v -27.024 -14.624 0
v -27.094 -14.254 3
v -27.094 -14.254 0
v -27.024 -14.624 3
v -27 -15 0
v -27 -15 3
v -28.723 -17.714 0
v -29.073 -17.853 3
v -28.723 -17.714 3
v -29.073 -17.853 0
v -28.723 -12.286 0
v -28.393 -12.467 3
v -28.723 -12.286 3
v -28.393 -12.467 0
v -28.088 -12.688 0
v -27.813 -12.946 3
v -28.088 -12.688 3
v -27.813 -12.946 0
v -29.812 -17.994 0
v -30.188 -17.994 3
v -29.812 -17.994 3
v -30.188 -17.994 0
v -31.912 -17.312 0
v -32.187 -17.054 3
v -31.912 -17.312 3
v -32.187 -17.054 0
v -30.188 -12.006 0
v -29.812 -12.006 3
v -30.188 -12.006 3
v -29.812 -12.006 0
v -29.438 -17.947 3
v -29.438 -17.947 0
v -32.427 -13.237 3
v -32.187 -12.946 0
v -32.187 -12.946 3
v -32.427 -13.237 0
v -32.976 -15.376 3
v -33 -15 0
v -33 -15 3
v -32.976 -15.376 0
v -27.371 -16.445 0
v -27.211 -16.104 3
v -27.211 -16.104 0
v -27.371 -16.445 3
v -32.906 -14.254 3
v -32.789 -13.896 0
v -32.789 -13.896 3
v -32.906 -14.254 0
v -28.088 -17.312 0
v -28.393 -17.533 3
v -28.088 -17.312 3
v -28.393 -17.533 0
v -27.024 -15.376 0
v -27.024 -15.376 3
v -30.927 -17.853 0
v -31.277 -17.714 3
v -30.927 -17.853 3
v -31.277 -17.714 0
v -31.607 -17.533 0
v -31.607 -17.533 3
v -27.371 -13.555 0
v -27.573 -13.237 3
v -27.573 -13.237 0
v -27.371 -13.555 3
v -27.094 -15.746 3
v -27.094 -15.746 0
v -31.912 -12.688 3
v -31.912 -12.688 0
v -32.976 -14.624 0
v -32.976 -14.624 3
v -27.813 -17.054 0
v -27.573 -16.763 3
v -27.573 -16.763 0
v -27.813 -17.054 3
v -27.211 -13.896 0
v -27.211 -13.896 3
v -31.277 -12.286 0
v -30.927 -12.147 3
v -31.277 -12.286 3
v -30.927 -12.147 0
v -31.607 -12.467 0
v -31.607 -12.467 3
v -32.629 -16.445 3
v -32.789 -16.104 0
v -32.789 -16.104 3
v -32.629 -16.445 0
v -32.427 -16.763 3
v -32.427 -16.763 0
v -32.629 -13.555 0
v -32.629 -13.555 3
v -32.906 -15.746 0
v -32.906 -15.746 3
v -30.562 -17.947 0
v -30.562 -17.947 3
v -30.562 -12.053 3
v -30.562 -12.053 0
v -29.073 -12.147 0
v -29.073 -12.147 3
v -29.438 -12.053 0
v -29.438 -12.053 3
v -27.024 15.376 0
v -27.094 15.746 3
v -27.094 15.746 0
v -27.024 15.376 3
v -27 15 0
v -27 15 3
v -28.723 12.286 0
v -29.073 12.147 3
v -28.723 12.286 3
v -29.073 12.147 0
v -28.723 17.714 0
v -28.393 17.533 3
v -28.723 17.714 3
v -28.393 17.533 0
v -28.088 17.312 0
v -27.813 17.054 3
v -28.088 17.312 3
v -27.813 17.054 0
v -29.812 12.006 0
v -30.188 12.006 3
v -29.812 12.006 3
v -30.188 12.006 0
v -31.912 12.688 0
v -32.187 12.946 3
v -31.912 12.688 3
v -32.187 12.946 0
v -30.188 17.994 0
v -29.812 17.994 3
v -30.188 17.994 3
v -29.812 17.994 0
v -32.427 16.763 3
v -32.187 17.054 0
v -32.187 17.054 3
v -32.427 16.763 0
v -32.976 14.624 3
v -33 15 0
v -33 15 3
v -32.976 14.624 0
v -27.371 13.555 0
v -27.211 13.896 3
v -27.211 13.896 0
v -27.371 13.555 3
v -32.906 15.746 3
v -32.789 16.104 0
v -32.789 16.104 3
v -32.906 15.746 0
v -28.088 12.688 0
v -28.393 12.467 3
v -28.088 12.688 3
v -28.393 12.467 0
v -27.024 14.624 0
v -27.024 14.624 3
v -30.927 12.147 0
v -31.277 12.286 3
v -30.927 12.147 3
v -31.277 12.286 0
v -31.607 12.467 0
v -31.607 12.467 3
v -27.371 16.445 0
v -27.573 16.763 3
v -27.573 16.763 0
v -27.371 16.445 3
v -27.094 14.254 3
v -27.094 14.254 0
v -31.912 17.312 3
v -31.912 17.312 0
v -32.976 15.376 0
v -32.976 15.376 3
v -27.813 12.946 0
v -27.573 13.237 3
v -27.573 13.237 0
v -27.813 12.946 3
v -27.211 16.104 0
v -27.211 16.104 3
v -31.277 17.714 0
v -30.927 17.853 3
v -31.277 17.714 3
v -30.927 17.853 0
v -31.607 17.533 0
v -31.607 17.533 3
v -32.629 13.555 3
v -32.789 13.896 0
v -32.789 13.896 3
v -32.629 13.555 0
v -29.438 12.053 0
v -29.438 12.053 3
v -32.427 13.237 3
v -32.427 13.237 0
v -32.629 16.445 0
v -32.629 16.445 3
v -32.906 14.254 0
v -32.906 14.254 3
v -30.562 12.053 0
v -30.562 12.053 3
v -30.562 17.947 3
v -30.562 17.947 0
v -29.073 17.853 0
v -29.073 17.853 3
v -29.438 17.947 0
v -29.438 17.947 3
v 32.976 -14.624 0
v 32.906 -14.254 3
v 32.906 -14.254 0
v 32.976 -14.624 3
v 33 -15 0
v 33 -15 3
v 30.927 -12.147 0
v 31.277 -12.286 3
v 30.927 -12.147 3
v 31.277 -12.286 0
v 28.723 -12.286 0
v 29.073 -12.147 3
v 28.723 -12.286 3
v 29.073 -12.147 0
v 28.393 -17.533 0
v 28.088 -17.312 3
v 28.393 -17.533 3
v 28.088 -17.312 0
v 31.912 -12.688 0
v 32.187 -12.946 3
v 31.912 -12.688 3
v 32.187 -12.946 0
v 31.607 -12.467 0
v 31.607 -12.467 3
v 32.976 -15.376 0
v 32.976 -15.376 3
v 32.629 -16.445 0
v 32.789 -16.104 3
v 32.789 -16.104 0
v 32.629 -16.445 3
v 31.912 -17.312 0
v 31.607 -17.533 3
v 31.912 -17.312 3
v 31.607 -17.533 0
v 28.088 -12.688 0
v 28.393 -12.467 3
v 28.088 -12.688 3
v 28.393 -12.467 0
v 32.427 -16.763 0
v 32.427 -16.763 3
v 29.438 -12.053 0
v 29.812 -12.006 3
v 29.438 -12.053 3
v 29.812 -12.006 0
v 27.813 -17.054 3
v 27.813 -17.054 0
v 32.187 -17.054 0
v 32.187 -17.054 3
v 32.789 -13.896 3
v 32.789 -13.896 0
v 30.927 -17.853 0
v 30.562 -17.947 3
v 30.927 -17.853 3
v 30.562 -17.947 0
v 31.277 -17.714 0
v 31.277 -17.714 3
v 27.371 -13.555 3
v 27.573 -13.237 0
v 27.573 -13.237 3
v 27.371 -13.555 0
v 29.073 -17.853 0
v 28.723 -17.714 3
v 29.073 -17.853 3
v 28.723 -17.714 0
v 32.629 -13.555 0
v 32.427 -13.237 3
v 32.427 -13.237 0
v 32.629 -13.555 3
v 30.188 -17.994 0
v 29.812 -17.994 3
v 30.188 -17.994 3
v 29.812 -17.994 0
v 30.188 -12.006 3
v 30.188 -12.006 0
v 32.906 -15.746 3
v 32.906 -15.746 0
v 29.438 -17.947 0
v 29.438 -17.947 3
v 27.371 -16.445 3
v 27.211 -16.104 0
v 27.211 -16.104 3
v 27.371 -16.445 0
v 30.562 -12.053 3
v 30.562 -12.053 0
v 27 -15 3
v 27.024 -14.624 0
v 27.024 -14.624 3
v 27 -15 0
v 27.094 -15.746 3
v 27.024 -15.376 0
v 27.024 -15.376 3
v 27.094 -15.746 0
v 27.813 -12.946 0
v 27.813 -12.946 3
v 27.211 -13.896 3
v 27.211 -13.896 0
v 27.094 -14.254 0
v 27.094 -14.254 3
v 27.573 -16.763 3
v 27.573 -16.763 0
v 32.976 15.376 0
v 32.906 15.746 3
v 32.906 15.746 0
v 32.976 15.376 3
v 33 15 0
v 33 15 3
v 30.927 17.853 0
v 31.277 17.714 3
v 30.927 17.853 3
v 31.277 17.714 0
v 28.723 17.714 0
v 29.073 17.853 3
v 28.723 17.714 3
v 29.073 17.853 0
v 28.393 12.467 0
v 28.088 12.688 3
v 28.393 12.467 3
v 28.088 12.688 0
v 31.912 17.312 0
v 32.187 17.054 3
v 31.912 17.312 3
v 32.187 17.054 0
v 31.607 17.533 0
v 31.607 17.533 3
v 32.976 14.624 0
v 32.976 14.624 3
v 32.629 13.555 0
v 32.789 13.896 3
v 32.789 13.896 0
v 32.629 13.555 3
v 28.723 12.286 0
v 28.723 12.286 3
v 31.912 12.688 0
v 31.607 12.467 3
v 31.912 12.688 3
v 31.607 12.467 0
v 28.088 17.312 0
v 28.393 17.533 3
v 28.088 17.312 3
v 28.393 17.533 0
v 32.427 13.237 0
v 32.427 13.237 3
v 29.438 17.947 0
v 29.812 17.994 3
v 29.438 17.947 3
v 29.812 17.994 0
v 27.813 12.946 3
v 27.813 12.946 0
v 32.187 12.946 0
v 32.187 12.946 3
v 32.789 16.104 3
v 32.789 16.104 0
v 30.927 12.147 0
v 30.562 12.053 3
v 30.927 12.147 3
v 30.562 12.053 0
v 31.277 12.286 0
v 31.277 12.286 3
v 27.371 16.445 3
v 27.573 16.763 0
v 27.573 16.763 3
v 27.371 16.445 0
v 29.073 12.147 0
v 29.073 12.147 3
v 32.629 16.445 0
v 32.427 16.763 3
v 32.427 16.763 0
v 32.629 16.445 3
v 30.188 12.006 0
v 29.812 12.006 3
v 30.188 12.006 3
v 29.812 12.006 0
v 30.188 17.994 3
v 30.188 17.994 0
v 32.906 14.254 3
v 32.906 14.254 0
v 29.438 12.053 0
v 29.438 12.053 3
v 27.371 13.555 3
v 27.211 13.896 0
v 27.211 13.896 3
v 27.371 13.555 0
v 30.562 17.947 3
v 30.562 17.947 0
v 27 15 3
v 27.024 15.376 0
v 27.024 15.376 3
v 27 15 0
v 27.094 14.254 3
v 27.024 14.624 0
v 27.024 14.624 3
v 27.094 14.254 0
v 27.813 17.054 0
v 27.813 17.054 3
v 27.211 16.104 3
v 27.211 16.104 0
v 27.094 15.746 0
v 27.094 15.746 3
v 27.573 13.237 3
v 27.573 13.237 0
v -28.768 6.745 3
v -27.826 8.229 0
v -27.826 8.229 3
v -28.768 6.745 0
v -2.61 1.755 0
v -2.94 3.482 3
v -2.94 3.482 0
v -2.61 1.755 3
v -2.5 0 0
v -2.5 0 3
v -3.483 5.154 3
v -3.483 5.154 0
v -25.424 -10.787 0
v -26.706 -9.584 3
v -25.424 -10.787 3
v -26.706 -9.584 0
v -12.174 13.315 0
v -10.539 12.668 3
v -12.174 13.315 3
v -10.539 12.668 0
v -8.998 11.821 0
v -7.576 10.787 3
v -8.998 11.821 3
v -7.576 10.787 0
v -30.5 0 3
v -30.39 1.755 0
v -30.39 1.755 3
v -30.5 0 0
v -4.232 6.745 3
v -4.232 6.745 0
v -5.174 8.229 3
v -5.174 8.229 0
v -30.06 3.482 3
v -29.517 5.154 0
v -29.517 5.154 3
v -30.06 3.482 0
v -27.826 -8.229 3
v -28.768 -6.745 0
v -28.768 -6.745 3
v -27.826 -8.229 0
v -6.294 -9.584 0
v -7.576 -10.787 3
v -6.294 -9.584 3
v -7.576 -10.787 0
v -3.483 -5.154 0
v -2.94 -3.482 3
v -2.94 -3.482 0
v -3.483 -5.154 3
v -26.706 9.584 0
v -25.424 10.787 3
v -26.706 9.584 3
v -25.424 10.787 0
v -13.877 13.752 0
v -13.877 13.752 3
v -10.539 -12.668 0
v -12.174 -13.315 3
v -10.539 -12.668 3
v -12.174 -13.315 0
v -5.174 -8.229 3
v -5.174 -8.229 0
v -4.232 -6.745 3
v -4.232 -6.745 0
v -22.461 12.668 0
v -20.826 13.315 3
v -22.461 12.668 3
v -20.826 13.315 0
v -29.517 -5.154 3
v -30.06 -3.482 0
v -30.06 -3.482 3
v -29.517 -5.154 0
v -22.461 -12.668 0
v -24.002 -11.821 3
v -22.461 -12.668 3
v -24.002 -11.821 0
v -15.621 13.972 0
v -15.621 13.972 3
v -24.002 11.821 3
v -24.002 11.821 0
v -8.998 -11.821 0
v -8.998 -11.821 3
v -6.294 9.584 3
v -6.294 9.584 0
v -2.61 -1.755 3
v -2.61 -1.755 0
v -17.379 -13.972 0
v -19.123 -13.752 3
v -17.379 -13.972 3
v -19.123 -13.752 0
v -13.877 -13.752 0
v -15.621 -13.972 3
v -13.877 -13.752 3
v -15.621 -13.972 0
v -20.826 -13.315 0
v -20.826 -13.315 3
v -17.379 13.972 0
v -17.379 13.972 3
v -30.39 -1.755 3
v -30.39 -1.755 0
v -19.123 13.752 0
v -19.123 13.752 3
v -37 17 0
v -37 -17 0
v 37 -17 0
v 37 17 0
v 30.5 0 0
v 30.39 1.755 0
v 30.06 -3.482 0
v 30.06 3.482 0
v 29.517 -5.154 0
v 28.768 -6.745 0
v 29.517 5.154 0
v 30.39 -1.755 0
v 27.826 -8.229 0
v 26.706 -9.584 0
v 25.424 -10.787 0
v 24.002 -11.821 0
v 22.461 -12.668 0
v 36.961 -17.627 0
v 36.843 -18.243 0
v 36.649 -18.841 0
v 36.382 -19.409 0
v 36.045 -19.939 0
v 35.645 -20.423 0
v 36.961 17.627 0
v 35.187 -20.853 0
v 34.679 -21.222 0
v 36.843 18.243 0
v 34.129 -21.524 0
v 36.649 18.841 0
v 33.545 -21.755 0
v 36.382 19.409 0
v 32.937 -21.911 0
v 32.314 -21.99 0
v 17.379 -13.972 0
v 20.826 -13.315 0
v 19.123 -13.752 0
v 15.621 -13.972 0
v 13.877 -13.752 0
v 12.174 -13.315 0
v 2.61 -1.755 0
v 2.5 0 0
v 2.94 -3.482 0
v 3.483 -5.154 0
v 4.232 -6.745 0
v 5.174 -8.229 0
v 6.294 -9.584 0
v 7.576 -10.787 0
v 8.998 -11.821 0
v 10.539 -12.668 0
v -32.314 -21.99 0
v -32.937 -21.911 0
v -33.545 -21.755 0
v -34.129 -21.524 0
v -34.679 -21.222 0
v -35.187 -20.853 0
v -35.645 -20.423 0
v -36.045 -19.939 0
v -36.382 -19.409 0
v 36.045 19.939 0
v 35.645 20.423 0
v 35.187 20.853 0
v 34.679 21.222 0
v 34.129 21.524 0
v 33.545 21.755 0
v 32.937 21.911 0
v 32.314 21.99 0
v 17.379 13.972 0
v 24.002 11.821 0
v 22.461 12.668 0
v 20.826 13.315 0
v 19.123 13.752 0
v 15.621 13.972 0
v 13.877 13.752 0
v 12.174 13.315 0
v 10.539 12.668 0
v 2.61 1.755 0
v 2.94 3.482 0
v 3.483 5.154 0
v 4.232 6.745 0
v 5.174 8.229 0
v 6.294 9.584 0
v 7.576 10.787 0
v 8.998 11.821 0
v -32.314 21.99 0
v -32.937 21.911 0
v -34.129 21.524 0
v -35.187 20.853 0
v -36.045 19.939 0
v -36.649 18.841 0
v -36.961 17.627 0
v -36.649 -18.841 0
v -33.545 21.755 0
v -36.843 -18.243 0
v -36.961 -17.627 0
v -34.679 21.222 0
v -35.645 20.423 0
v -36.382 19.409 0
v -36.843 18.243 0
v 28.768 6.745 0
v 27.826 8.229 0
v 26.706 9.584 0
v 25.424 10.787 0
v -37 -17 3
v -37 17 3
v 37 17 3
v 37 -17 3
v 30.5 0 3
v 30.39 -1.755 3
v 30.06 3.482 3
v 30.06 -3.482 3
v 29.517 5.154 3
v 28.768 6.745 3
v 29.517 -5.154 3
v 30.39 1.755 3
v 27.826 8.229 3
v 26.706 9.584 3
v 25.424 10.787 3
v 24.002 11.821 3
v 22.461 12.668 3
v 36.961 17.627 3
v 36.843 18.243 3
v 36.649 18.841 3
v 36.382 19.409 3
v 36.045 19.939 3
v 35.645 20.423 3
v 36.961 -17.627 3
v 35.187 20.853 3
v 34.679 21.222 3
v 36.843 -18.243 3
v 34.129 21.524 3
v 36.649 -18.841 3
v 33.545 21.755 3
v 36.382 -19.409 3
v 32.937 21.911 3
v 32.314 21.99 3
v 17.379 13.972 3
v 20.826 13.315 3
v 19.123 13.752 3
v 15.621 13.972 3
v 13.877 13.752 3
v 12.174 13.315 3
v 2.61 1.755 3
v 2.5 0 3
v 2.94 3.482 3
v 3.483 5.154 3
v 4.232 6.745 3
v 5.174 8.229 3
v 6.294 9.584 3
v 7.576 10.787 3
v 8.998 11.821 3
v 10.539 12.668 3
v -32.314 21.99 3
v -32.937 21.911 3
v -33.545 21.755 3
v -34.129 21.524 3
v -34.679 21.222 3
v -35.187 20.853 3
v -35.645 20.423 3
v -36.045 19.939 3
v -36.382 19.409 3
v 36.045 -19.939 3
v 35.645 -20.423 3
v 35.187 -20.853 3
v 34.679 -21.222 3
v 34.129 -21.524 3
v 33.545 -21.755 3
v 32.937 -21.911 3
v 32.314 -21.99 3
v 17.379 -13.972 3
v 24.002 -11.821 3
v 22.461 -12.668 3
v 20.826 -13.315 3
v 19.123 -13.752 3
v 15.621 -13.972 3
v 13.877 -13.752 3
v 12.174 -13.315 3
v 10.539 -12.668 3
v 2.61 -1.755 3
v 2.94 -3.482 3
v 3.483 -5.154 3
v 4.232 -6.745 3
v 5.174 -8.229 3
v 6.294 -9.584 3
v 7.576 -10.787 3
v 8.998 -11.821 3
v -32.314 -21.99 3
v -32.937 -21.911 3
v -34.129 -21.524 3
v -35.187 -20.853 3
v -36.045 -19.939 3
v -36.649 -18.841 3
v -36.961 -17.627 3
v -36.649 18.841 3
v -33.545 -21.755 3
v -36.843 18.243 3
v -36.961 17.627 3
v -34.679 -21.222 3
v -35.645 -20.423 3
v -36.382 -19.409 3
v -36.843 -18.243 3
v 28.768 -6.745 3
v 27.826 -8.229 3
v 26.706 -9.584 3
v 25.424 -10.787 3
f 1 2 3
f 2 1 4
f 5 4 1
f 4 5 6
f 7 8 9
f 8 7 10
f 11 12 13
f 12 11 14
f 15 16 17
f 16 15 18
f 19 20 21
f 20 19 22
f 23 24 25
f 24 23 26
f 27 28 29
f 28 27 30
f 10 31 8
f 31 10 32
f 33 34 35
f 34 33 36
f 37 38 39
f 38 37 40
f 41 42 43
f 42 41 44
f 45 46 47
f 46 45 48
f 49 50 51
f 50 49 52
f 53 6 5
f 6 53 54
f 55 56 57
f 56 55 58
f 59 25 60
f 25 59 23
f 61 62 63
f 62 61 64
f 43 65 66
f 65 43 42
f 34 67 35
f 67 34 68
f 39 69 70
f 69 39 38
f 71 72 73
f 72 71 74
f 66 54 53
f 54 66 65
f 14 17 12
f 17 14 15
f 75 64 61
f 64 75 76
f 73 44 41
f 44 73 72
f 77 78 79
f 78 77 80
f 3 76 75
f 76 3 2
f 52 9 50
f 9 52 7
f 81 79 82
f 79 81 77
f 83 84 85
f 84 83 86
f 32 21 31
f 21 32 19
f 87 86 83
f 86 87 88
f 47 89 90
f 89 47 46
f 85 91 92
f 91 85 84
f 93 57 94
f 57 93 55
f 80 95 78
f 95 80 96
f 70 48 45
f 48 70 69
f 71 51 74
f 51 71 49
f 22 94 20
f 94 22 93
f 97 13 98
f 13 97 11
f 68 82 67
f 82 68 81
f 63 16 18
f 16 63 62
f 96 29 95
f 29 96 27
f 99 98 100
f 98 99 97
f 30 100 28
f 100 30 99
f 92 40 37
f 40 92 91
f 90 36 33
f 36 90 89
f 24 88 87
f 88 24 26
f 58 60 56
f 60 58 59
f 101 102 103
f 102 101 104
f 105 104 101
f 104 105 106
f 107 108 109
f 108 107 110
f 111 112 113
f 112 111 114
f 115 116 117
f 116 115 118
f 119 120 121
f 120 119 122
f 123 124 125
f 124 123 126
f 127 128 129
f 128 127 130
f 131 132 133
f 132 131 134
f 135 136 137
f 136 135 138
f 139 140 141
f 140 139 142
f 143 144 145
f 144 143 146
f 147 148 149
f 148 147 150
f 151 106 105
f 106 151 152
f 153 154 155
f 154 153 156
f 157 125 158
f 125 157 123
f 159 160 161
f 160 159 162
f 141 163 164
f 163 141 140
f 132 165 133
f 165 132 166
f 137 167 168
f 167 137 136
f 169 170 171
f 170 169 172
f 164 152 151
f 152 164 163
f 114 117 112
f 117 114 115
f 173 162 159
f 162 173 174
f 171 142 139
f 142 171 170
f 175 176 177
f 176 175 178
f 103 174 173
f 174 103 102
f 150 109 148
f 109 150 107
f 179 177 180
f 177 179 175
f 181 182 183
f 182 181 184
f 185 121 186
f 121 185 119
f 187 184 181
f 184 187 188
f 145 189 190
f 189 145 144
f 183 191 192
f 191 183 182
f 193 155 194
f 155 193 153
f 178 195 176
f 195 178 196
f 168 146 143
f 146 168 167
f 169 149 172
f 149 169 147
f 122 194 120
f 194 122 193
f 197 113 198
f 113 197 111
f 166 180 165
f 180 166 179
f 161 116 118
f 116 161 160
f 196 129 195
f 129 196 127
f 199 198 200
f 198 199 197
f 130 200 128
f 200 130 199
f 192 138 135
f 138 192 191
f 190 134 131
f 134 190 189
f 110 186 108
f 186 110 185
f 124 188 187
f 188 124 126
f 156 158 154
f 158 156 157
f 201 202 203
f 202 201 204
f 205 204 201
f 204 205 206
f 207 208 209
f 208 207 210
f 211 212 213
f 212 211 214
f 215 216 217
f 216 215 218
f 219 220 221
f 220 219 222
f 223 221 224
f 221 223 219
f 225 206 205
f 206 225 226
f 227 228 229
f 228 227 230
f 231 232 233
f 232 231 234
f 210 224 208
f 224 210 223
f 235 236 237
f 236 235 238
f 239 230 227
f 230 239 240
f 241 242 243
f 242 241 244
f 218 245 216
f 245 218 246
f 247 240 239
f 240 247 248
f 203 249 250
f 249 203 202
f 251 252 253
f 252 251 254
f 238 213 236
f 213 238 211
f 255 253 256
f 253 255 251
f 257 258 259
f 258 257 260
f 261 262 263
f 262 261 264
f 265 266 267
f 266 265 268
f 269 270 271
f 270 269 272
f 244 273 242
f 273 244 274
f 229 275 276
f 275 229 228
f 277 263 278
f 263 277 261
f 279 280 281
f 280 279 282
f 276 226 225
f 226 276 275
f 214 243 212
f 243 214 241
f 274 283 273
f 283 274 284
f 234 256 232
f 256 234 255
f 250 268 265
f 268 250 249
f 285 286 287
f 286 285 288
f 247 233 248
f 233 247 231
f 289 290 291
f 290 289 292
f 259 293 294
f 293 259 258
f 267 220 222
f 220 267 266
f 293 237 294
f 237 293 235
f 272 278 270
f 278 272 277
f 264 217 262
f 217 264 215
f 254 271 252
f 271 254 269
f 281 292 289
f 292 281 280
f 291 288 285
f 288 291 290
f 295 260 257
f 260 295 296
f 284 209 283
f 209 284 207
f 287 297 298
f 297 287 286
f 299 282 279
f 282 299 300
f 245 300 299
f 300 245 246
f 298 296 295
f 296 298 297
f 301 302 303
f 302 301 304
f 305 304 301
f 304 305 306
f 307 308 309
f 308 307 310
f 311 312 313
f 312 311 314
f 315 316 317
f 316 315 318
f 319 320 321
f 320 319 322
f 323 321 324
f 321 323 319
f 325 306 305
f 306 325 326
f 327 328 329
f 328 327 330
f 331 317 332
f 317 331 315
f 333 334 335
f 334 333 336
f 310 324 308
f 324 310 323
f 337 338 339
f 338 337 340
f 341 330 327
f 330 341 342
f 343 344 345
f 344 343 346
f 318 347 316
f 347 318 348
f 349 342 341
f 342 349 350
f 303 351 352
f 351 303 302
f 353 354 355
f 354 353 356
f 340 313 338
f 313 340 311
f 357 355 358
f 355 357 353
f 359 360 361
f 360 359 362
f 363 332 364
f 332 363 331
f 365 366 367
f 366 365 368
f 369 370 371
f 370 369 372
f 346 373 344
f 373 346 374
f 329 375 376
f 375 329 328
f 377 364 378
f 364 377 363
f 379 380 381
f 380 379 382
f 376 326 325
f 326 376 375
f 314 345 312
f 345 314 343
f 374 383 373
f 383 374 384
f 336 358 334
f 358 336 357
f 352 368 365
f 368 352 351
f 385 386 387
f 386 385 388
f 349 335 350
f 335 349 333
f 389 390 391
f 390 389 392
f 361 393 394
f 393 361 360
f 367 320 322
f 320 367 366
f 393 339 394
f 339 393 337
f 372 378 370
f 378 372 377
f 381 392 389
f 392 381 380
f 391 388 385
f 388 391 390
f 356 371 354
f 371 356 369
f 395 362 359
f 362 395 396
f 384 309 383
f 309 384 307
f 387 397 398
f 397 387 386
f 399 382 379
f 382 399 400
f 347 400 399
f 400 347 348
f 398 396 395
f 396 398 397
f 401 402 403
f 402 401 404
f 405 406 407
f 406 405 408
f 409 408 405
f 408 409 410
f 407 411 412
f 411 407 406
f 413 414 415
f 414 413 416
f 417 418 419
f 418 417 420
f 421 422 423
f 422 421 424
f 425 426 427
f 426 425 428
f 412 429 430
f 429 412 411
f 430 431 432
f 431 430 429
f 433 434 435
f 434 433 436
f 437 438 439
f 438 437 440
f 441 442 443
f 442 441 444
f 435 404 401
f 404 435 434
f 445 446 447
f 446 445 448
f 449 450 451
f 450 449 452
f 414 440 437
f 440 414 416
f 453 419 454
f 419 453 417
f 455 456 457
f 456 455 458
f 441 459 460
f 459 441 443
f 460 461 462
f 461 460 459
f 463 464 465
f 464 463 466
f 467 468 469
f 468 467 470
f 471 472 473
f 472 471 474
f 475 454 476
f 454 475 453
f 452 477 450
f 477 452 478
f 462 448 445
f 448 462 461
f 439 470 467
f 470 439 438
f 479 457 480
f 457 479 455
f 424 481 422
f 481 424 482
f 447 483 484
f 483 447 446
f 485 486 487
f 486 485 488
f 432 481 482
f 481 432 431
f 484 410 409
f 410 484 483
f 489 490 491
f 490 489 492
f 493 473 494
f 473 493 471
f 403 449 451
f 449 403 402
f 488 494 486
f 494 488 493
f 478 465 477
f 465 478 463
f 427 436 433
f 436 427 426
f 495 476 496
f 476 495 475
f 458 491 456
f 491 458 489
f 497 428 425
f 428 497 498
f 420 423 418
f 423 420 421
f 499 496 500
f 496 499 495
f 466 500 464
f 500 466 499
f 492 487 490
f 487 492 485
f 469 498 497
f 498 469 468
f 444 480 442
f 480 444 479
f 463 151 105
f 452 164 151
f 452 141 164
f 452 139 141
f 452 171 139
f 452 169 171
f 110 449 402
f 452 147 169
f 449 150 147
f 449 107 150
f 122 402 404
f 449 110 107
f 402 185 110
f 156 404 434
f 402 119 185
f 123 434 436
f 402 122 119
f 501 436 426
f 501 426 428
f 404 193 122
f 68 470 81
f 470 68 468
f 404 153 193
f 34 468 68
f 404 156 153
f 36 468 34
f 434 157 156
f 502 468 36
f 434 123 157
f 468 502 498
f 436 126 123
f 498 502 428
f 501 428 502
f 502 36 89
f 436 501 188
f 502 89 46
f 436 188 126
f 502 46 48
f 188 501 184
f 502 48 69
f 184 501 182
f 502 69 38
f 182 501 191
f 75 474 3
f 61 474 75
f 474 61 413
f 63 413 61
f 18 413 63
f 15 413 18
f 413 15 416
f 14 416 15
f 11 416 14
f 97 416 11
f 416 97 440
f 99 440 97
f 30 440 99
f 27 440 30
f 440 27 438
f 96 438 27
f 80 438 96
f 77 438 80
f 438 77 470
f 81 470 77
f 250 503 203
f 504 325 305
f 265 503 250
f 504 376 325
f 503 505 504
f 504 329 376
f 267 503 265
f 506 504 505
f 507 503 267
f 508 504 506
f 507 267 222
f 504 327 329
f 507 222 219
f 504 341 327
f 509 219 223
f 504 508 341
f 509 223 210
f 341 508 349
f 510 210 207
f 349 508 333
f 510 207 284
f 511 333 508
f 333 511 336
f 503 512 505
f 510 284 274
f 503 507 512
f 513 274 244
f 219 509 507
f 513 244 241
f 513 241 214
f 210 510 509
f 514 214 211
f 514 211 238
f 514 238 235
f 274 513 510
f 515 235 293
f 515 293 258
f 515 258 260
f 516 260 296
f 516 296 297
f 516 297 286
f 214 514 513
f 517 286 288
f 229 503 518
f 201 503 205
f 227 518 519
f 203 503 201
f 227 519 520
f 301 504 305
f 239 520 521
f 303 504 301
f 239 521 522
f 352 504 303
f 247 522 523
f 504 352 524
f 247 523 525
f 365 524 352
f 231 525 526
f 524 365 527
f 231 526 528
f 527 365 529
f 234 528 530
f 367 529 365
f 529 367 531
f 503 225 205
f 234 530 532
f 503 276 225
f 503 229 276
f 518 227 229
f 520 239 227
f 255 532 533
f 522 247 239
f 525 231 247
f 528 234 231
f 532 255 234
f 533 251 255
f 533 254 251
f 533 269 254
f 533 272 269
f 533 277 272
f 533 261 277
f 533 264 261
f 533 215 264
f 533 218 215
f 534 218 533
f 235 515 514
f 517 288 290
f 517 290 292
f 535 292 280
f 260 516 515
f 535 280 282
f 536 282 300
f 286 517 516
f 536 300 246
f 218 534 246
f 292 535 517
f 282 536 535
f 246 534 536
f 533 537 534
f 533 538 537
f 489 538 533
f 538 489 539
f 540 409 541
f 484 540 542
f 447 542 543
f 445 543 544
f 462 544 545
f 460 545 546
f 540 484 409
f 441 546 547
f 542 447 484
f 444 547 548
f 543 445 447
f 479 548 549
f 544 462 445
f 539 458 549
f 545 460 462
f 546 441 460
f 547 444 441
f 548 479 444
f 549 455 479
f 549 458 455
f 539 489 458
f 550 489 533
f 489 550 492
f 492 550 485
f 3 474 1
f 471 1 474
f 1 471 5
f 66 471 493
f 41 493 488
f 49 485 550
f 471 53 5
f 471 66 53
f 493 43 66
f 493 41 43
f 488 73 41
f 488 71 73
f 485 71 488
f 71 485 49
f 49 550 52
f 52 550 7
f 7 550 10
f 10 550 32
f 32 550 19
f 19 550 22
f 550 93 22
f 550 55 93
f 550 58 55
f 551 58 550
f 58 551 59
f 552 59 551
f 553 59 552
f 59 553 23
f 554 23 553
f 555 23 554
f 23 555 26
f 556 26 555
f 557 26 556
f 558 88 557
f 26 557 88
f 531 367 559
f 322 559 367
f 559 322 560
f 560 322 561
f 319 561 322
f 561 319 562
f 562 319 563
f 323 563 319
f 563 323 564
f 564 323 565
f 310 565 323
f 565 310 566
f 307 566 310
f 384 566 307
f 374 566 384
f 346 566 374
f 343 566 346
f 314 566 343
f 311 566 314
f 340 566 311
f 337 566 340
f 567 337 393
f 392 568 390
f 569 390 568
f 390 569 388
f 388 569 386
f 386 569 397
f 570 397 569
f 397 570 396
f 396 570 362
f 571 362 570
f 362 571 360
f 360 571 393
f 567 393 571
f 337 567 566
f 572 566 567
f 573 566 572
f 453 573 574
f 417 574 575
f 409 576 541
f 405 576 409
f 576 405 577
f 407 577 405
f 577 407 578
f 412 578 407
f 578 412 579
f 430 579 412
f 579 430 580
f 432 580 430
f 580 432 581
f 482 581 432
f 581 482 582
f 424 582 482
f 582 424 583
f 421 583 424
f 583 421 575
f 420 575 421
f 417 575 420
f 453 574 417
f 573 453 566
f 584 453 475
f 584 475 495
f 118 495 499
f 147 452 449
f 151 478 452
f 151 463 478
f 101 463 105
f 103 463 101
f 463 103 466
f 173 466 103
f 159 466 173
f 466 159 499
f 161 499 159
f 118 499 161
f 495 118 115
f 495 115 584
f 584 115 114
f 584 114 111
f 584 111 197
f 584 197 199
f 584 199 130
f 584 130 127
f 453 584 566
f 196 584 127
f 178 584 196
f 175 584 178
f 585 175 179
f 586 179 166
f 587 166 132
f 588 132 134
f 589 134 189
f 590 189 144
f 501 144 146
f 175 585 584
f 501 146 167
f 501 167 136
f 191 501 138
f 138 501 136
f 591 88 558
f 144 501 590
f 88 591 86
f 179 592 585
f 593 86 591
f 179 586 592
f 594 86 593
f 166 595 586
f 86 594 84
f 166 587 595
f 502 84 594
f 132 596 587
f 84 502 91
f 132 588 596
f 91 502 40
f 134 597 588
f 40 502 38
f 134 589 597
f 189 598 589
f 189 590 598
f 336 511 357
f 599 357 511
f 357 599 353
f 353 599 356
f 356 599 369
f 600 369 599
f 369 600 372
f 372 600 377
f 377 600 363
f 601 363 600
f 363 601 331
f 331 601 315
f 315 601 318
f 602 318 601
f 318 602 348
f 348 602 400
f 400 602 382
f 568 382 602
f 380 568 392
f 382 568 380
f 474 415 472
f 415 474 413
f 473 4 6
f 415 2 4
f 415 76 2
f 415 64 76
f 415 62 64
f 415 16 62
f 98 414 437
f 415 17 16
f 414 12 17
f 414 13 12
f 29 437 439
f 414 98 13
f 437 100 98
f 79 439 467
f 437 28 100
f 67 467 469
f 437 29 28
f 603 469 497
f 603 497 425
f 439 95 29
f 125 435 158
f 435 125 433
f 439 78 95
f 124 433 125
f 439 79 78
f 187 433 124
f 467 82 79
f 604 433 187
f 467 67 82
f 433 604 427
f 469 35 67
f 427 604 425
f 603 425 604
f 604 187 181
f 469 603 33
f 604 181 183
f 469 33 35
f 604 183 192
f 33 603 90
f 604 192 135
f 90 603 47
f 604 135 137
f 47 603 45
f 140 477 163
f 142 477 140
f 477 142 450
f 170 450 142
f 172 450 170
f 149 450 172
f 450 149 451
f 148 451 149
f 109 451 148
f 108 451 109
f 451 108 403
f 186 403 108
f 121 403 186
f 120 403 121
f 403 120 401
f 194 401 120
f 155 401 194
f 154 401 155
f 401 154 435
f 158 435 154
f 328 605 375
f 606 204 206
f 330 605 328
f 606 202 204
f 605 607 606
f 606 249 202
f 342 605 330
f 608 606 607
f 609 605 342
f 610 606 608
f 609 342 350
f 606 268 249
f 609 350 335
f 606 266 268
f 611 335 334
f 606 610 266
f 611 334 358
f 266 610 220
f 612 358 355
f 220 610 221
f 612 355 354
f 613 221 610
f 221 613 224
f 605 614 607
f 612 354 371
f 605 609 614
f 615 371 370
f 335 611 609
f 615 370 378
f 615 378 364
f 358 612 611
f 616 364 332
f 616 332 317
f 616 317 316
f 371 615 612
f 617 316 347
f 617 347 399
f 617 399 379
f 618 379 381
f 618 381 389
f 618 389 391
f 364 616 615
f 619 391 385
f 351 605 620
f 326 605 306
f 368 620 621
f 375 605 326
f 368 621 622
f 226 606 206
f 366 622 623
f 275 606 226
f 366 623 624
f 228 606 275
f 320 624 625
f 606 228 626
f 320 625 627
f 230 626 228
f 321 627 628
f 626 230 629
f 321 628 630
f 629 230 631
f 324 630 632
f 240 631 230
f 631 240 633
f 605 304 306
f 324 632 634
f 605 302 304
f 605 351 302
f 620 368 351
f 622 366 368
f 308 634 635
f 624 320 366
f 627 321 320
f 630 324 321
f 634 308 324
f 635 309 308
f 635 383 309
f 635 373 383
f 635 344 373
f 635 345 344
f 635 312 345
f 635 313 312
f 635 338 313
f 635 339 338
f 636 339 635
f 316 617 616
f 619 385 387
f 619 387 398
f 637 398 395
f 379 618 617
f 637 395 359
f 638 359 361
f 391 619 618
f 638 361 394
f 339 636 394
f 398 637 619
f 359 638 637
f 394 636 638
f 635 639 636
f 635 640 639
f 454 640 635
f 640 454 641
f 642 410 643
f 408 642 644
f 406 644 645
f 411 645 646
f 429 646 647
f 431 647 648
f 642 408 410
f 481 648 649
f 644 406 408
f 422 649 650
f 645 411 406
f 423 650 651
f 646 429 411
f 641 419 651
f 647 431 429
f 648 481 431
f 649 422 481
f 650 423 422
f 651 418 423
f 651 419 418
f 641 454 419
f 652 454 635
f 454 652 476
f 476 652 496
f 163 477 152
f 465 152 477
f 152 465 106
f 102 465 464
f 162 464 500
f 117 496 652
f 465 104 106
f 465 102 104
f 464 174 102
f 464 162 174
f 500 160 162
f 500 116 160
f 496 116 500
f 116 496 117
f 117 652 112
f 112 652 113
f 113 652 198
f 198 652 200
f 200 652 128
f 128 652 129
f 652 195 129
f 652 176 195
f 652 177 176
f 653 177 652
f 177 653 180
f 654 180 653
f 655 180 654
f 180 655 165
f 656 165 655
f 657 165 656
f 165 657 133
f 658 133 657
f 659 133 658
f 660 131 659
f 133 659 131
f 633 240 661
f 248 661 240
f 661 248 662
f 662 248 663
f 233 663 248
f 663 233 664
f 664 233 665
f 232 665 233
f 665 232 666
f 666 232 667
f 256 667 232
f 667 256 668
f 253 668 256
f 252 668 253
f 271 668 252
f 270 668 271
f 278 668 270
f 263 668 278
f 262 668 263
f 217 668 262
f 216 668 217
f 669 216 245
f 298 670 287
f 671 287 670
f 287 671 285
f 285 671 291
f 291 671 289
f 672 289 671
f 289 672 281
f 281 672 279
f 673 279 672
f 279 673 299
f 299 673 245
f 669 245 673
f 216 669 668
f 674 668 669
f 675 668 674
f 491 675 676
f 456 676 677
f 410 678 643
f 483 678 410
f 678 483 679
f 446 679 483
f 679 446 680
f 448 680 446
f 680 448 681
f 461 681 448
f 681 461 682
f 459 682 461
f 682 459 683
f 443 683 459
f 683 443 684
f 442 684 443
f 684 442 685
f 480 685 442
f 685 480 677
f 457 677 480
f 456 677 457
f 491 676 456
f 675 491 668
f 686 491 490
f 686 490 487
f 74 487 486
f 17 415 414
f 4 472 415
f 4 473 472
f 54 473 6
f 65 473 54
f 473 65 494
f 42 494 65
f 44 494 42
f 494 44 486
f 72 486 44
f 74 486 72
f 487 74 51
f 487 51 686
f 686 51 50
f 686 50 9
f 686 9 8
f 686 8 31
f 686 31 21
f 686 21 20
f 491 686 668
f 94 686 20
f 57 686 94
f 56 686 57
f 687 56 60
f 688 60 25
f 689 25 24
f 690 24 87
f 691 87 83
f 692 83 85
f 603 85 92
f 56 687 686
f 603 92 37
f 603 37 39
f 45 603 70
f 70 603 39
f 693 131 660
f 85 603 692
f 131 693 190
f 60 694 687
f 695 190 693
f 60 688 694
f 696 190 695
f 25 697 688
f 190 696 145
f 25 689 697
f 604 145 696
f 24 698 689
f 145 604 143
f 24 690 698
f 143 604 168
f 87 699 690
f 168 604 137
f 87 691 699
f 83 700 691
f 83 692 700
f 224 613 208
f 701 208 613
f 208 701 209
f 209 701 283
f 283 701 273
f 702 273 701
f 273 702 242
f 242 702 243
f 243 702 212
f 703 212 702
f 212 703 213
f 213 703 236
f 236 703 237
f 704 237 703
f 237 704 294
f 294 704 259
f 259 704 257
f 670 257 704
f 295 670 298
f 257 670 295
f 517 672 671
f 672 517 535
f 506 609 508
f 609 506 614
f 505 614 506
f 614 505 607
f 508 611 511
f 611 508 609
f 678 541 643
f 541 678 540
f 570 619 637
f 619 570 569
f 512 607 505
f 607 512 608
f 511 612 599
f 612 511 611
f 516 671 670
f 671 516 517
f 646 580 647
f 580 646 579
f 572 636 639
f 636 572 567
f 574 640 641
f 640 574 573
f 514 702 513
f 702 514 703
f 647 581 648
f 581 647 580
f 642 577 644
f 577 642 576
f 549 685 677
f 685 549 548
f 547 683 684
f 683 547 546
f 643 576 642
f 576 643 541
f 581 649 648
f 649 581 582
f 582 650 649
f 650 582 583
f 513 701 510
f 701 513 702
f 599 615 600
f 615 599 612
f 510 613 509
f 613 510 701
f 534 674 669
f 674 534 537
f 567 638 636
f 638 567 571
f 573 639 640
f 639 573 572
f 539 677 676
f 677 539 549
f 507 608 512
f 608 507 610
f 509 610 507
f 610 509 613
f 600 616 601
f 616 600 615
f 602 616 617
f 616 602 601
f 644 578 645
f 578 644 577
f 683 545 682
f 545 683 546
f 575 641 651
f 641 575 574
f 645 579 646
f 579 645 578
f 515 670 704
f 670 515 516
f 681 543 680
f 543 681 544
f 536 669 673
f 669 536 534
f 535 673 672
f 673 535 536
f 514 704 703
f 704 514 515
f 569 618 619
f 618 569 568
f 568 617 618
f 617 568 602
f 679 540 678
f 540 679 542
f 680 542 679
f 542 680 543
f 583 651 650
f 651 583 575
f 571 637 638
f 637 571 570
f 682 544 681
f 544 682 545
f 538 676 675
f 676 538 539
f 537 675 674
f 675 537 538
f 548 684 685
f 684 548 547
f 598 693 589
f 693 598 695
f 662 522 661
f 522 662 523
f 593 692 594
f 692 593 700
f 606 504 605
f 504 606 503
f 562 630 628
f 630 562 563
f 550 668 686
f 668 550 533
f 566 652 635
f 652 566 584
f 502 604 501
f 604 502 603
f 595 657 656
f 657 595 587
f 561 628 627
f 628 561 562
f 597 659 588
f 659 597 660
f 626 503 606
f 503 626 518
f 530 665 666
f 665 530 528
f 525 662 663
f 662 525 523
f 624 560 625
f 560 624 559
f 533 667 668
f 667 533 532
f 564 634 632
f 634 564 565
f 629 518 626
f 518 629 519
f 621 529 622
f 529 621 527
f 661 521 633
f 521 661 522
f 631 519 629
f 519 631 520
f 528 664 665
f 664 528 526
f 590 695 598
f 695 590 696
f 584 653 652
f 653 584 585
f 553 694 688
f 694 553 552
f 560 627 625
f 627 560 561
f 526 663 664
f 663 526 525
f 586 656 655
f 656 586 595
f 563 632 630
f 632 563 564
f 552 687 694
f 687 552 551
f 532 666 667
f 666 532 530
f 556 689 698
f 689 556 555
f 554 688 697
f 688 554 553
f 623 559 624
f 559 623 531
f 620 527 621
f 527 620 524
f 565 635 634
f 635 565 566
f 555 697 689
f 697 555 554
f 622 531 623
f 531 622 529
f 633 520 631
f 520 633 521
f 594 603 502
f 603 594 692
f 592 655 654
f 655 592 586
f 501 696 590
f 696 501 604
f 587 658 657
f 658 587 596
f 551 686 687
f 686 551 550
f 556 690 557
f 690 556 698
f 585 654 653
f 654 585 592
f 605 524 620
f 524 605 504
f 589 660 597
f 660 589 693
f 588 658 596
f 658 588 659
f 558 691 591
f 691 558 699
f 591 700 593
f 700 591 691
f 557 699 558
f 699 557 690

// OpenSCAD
$fn = 50;


difference() {
	union() {
		hull() {
			translate(v = [-32.0000000000, 17.0000000000, 0]) {
				cylinder(h = 3, r = 5);
			}
			translate(v = [32.0000000000, 17.0000000000, 0]) {
				cylinder(h = 3, r = 5);
			}
			translate(v = [-32.0000000000, -17.0000000000, 0]) {
				cylinder(h = 3, r = 5);
			}
			translate(v = [32.0000000000, -17.0000000000, 0]) {
				cylinder(h = 3, r = 5);
			}
		}
	}
	union() {
		#translate(v = [-30.0000000000, -15.0000000000, -100.0000000000]) {
			cylinder(h = 200, r = 3.0000000000);
		}
		#translate(v = [-30.0000000000, 15.0000000000, -100.0000000000]) {
			cylinder(h = 200, r = 3.0000000000);
		}
		#translate(v = [30.0000000000, -15.0000000000, -100.0000000000]) {
			cylinder(h = 200, r = 3.0000000000);
		}
		#translate(v = [30.0000000000, 15.0000000000, -100.0000000000]) {
			cylinder(h = 200, r = 3.0000000000);
		}
		#translate(v = [-16.5000000000, 0, 0]) {
			cylinder(h = 3, r = 14.0000000000);
		}
		#translate(v = [16.5000000000, 0, 0]) {
			cylinder(h = 3, r = 14.0000000000);
		}
	}
}
